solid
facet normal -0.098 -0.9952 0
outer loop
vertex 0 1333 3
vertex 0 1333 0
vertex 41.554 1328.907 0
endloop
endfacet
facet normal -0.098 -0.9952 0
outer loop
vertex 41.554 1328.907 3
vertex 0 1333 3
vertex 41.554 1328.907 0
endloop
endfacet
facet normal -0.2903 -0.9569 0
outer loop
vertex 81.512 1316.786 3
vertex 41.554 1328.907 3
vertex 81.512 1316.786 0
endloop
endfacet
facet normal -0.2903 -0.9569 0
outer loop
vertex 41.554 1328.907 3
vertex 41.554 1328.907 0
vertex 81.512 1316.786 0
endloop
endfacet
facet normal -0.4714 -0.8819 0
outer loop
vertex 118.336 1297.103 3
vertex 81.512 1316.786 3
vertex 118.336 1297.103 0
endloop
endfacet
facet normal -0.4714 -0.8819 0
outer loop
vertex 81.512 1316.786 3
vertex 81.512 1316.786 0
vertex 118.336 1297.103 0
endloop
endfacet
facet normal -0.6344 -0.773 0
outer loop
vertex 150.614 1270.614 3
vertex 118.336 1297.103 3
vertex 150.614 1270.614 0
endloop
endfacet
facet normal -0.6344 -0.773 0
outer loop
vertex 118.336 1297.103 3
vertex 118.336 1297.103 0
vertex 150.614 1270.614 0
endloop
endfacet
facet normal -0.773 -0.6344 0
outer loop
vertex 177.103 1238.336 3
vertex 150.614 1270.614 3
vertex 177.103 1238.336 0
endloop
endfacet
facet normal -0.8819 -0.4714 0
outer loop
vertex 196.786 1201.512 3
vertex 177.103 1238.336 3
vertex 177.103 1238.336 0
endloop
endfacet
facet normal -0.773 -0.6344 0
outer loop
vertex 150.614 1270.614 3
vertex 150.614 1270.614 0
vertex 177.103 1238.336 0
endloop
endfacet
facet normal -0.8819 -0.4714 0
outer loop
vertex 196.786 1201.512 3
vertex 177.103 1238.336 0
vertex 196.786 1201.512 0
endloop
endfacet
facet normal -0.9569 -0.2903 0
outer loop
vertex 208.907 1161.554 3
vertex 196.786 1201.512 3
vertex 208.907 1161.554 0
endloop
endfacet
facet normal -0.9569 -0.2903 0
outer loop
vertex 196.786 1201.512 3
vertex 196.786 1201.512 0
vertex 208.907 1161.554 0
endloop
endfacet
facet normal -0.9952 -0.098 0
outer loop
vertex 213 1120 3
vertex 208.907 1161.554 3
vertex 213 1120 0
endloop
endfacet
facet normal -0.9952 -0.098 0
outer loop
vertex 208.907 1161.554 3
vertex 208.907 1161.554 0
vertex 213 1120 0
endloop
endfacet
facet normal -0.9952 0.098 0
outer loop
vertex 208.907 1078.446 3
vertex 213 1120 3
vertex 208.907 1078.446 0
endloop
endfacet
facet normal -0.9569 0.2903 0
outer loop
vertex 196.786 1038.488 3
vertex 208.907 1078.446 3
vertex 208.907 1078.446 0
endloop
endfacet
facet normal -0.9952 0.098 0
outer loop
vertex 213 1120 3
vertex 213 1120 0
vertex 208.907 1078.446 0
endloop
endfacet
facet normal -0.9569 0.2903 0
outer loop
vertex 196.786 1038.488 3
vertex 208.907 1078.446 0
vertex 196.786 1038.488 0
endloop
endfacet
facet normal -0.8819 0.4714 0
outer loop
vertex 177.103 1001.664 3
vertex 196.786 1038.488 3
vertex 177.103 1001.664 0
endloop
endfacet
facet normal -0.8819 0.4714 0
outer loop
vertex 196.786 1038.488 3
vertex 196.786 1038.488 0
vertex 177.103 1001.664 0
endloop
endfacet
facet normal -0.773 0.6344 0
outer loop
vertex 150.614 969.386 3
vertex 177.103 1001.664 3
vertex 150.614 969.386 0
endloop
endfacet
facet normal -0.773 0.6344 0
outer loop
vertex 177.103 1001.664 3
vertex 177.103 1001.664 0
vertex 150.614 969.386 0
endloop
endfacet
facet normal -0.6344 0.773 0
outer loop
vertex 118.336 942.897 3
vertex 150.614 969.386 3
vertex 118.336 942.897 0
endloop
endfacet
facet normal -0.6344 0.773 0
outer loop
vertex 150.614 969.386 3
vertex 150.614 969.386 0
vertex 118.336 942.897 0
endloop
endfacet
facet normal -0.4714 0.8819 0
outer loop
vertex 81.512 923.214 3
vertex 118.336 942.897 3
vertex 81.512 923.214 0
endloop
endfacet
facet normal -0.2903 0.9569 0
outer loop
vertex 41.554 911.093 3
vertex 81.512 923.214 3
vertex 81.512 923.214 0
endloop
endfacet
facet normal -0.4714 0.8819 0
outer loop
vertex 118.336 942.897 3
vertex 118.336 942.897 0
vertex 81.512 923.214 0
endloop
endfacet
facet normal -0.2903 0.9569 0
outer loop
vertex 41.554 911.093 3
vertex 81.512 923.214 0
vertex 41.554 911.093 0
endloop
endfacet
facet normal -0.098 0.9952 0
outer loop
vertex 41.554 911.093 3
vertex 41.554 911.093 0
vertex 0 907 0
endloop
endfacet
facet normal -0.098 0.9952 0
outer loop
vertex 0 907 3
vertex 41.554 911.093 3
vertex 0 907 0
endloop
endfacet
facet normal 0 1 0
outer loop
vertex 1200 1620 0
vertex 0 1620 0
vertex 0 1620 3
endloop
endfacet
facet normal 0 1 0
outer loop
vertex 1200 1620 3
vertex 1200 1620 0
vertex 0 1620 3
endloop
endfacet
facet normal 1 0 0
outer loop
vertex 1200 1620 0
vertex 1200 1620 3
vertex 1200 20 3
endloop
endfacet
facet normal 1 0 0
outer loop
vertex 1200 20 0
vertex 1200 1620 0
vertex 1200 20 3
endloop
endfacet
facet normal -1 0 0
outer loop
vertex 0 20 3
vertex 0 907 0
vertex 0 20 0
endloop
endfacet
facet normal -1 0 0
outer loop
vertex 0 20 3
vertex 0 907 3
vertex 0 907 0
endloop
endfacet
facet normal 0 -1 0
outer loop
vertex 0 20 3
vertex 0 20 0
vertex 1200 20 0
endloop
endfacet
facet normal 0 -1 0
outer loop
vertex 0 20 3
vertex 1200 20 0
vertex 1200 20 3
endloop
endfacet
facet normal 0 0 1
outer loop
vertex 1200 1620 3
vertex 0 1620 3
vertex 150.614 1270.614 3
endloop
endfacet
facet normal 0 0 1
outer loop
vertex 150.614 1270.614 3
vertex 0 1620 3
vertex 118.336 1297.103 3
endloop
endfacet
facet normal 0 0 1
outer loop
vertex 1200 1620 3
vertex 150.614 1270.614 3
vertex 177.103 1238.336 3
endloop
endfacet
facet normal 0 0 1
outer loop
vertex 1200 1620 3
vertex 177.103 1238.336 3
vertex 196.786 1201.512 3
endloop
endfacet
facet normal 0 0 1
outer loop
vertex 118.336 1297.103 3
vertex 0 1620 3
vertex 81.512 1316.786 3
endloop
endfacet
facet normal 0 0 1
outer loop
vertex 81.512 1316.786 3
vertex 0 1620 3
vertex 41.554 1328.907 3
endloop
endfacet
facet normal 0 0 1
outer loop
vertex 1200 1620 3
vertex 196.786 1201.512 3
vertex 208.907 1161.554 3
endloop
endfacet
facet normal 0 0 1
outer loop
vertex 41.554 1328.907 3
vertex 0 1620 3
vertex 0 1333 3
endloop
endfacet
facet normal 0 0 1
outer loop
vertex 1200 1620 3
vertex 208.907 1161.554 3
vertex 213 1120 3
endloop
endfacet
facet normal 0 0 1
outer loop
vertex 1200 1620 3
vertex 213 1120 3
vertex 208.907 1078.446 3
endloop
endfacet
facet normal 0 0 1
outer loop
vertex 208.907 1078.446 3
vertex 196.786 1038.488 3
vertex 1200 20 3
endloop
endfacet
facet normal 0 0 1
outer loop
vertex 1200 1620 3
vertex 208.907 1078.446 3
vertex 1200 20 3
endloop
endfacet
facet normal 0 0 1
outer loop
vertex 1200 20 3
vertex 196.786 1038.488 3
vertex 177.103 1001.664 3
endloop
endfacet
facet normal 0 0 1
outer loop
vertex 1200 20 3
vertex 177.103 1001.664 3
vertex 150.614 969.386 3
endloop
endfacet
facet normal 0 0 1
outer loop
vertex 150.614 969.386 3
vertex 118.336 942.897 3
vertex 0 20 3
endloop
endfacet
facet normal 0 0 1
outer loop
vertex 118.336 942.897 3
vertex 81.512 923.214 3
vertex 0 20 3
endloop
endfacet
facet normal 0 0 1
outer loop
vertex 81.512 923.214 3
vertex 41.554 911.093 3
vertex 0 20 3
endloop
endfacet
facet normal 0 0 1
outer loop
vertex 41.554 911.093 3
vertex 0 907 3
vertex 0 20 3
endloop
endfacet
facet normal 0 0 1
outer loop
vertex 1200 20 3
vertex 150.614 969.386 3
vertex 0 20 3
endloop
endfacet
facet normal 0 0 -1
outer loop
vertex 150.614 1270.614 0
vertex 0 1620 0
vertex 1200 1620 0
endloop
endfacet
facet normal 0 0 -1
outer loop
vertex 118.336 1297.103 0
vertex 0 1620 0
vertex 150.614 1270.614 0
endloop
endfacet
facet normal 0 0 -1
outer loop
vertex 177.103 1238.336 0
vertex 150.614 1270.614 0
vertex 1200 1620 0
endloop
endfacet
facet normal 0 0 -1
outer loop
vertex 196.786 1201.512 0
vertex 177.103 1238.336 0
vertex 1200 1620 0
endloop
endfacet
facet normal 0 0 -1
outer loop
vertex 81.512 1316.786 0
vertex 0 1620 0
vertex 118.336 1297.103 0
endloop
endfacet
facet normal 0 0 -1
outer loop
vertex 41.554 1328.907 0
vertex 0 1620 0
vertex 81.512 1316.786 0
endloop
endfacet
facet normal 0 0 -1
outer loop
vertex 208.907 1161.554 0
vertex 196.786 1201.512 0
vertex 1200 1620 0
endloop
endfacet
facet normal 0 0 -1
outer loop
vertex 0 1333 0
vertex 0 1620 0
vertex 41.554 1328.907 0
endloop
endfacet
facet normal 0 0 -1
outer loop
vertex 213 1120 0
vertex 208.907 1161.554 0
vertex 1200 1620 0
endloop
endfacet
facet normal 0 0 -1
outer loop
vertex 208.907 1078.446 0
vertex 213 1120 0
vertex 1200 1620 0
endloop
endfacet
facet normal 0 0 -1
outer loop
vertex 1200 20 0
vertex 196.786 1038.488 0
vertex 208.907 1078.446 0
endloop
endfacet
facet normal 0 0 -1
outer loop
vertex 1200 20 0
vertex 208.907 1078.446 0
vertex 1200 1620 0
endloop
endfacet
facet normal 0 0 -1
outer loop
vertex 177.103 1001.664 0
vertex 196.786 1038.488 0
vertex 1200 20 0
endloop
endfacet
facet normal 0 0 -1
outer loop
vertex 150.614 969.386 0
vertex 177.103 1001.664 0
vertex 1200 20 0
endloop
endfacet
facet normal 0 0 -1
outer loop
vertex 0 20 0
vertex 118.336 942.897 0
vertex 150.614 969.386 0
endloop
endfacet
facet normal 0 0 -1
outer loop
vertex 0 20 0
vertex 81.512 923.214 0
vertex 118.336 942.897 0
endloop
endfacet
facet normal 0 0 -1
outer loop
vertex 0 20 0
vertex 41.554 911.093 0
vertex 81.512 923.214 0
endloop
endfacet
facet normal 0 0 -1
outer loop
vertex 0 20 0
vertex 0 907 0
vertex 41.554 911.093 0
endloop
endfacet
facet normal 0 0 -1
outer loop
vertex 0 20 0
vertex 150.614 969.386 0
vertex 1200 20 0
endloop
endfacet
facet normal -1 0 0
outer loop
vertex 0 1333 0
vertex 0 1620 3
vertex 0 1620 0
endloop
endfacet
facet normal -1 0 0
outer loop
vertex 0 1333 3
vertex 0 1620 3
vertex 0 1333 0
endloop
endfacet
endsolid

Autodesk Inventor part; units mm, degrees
ref_plane "YZ Plane" through (0, 0, 0) normal (1, 0, 0) x (0, 1, 0)
ref_plane "XZ Plane" through (0, 0, 0) normal (0, 1, 0) x (-1, 0, 0)
ref_plane "XY Plane" through (0, 0, 0) normal (0, 0, 1) x (1, 0, 0)
sketch "Sketch1" plane through (0, 0, 0) normal (1, 0, 0) x (0, 1, 0)
  line L0 (1620, 0) -> (70, 0)
  line L1 (70, 0) -> (20, 0)
  line L2 (20, 0) -> (0, 0)
  dimension "d0" = 180
  dimension "d1" = 50
  dimension "d2" = 1620
  dimension "d3" = 20
contour flange "Contour Flange1" sketch "Sketch1" thickness 3 bend radius 3 width 1200 along (1, 0, 0) mid plane no both sides no wall seen from (0, 845, 0) lies toward (0, 0, 1) curves L0 L1
bend "Bend1"
corner "Corner1"
sketch "Sketch3" plane through (0, 49.7046, 0) normal (0, 0, -1) x (-1, 0, 0)
  line L0 (-1197.5147, 1570.2954) -> (-1197.5147, -29.7046) construction
  line L1 (0, 1570.2954) -> (0, -29.7046)
  line L2 (-1200, 1570.2954) -> (0, 1570.2954) construction
  line L3 (0, 1570.2954) -> (0, -29.7046) projected
  circle A0 centre (0, 1070.2954) radius 213
  line L4 (0, -29.7046) -> (-1200, -29.7046) projected
  point P0 (0, -49.7046)
  point P1 (0, 0)
  point P2 (0, 857.2954)
  point P3 (0, 1283.2954)
  dimension "d25" = 426
  dimension "d26" = 500
extrude "Cut1" cut sketch "Sketch3" against normal blind 3 contours L1 A0 picked at (-58.5713, 1129.0628)
sketch "Sketch2" plane through (1197.8787, 20, 0.8787) normal (0.7071068, 0, 0.7071068) x (0, 1, 0)
  line L0 (1600, 0) -> (0, 0)
  line L1 (0, 0) -> (0, -50)
  line L2 (0, -50) -> (1600, -50)
  line L3 (1600, -50) -> (1600, 0)
equation "\"d27\" = Thickness"
equation "\"d4\" = Thickness"
equation "\"d5\" = BendReliefWidth"
equation "\"d6\" = BendReliefDepth"
equation "\"d7\" = MinimumRemnant"
equation "\"d8\" = TransitionRadius"
equation "\"d10\" = BendRadius"
equation "\"d12\" = CornerReliefSize"
equation "\"d13\" = GapSize"
equation "\"d14\" = JacobiRadiusSize"
equation "\"BendRadius\" = Thickness"
equation "\"BendReliefWidth\" = Thickness"
equation "\"BendReliefDepth\" = 0.5 * Thickness"
equation "\"CornerReliefSize\" = 4 * Thickness"
equation "\"MinimumRemnant\" = 2 * Thickness"
equation "\"TransitionRadius\" = BendRadius"
equation "\"JacobiRadiusSize\" = BendRadius"
equation "\"GapSize\" = Thickness"
equation "\"Thickness\" = 3"
properties part number "GBK-RK-0017 long wall 3"
